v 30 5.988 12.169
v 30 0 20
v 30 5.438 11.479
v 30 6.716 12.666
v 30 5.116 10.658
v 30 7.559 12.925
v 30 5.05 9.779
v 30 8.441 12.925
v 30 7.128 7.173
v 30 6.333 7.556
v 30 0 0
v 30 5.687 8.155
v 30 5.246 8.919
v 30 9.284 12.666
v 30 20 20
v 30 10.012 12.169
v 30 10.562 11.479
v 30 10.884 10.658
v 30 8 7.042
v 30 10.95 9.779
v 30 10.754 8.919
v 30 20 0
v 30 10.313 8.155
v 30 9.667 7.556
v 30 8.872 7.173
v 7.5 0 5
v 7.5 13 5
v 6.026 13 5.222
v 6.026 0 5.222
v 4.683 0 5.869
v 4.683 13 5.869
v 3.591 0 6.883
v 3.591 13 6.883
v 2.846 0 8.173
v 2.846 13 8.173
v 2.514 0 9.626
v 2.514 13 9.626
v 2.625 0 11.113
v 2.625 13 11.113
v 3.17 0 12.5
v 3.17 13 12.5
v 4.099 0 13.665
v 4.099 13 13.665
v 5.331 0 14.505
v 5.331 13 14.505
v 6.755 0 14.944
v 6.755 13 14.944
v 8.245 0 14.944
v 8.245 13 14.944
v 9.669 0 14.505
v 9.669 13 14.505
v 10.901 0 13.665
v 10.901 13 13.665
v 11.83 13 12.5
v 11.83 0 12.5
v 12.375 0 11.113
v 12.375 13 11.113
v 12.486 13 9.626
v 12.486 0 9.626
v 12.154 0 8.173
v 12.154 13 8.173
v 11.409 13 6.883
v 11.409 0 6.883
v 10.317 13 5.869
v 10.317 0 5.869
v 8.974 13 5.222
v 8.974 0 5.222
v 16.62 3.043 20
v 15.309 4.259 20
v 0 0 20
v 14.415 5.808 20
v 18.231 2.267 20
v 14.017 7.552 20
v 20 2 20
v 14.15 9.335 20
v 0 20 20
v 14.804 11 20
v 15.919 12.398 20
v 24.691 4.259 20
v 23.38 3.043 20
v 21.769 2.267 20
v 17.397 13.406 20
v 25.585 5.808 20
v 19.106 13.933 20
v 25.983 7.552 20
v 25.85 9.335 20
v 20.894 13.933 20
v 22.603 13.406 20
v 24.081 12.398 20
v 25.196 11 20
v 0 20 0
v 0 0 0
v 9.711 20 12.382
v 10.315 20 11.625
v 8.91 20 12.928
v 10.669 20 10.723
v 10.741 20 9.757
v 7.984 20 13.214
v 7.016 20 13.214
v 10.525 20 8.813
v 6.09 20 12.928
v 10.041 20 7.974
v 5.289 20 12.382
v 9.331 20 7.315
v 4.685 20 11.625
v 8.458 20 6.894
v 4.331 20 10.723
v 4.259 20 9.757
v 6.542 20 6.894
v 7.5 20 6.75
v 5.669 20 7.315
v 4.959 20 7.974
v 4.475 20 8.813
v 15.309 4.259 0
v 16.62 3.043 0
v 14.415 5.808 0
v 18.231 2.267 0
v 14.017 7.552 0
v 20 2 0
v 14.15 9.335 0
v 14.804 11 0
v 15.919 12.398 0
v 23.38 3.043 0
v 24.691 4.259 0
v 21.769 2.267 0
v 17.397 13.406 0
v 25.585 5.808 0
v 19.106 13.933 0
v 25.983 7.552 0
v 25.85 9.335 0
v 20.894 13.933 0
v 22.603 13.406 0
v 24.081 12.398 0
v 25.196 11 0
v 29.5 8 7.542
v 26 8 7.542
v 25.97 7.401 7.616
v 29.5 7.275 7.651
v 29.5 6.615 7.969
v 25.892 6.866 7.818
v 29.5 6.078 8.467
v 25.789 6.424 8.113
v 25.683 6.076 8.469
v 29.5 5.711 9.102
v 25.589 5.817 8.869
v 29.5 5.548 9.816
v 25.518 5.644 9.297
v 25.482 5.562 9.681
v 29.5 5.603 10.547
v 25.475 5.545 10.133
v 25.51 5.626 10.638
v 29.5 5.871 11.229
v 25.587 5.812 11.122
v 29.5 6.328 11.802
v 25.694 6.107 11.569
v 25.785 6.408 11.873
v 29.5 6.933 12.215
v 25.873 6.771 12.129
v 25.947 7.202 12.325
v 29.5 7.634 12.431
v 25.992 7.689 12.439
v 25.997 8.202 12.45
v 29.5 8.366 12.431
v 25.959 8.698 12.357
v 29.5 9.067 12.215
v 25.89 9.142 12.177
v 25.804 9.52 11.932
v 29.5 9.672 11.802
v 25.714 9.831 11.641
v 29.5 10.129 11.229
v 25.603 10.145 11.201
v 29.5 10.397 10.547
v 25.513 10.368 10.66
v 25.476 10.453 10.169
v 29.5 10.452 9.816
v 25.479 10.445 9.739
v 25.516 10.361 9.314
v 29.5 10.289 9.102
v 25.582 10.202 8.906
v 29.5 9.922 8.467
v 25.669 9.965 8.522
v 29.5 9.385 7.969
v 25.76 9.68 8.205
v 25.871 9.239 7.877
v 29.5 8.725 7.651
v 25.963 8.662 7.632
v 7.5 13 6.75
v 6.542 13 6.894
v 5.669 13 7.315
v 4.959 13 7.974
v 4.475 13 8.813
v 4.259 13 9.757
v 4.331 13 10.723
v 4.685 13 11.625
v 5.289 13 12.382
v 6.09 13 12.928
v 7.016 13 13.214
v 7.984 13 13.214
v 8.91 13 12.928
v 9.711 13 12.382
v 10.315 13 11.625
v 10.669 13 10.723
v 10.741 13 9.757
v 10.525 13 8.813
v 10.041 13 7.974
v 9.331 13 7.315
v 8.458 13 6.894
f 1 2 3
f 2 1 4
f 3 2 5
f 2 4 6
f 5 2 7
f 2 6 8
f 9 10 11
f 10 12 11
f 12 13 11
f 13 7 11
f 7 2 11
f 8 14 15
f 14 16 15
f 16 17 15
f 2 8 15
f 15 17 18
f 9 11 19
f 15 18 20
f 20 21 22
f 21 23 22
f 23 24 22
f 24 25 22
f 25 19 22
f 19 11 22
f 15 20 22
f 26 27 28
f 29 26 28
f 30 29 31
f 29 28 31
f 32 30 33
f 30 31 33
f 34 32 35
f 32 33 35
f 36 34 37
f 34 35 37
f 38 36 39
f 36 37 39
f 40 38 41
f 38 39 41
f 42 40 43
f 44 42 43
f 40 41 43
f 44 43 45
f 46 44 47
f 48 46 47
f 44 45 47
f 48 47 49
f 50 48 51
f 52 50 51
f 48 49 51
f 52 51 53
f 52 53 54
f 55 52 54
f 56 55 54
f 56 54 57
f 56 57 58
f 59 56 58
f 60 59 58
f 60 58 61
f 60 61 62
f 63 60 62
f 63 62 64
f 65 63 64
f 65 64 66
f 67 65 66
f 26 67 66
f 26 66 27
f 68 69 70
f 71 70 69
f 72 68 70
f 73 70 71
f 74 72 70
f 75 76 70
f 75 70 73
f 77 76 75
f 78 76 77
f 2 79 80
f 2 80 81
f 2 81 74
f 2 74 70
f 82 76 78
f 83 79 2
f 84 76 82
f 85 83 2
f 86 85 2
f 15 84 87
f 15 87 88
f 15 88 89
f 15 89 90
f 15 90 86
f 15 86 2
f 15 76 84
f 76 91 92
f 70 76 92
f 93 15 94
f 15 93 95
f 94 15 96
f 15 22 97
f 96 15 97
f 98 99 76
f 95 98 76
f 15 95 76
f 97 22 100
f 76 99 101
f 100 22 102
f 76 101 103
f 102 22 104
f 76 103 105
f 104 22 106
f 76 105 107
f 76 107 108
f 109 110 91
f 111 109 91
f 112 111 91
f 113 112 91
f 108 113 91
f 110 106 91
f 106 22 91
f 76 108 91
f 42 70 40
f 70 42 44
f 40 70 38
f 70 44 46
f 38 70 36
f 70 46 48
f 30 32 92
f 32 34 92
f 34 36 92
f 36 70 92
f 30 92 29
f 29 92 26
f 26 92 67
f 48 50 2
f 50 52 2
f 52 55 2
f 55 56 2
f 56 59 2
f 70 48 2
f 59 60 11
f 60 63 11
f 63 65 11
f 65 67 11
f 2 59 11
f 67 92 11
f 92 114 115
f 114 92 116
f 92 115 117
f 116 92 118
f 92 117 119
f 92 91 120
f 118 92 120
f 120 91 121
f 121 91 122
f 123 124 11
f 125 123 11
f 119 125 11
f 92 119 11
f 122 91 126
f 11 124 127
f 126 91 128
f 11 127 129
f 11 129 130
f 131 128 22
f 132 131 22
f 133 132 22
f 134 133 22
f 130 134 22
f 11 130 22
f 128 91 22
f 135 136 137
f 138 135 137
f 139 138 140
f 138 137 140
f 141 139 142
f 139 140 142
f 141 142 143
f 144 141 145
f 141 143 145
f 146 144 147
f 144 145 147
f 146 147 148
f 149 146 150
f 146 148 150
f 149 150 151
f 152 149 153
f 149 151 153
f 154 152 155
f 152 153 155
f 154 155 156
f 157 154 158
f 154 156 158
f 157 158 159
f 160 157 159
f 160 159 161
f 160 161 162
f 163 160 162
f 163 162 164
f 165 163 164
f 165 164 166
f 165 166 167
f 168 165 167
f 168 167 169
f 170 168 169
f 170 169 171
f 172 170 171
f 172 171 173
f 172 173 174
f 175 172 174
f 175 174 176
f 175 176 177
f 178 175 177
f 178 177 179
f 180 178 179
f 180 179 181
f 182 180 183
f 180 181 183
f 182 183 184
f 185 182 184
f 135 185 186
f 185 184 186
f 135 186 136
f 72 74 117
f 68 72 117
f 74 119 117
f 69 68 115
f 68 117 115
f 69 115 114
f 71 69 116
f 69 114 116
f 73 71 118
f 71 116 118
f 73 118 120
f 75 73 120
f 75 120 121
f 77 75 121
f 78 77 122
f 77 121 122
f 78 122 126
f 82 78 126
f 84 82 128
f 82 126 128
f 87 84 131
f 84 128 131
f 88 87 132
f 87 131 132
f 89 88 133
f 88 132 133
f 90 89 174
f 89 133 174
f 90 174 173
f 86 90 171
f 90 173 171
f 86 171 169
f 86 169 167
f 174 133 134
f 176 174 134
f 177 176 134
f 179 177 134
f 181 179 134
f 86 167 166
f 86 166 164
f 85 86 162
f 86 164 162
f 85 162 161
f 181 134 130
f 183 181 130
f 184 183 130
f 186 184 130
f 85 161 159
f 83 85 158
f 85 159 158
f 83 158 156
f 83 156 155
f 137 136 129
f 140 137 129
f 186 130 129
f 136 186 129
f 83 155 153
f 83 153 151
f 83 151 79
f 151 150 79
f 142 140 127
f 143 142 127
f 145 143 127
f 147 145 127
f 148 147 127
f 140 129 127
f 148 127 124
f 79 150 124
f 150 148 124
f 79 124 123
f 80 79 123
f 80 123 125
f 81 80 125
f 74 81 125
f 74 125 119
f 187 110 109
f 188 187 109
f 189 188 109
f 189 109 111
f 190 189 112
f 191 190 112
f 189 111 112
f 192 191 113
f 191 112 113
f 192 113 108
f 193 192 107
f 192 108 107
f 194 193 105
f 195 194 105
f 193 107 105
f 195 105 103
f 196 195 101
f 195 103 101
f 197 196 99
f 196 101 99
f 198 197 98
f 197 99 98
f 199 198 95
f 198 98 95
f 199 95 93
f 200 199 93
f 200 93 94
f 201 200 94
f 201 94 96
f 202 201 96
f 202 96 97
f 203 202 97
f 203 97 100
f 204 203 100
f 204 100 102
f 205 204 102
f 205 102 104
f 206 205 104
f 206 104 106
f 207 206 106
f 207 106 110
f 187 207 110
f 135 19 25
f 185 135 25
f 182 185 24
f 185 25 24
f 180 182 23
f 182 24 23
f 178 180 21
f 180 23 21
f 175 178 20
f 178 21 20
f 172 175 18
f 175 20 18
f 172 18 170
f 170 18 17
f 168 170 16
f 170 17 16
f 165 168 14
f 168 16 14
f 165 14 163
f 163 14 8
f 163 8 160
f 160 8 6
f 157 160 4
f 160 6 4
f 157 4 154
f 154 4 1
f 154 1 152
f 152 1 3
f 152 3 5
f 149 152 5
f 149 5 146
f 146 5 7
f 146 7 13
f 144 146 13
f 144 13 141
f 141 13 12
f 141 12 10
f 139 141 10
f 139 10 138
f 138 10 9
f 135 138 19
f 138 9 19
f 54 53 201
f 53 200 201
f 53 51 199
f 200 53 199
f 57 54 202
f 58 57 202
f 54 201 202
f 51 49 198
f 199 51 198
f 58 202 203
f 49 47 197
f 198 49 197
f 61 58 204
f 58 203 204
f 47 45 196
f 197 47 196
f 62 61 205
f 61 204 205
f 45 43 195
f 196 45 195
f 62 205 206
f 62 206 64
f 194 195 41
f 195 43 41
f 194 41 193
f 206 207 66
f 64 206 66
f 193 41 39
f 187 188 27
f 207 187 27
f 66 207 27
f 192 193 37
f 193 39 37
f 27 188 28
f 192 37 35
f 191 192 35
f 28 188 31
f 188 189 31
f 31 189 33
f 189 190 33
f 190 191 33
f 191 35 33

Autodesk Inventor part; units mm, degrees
ref_plane "YZ Plane" through (0, 0, 0) normal (1, 0, 0) x (0, 1, 0)
ref_plane "XZ Plane" through (0, 0, 0) normal (0, 1, 0) x (-1, 0, 0)
ref_plane "XY Plane" through (0, 0, 0) normal (0, 0, 1) x (1, 0, 0)
sketch "Sketch1" plane through (0, 0, 0) normal (0, 0, 1) x (1, 0, 0)
  line L0 (0, 0) -> (30, 0)
  line L1 (30, 0) -> (30, 20)
  line L2 (30, 20) -> (0, 20)
  line L3 (0, 20) -> (0, 0)
  dimension "d0" = 30
  dimension "d1" = 20
extrude "Extrusion1" add sketch "Sketch1" along normal blind 20
sketch "Sketch2" plane through (0, 0, 0) normal (0, -1, 0) x (1, 0, 0)
  line L0 (30, 20) -> (0, 20) projected
  line L1 (0, 0) -> (0, 20) projected
  point P0 (7.5, 10)
  dimension "d4" = 7.5
  dimension "d5" = 10
hole "Hole1" at (7.5, 0, 10) direction (0, 1, 0) diameter 6.5 depth 20 tip angle 118 counterbore diameter 10 counterbore depth 13
sketch "Sketch3" plane through (0, 0, 20) normal (0, 0, 1) x (1, 0, 0)
  line L0 (0, 0) -> (0, 20) projected
  line L1 (0, 20) -> (30, 20) projected
  point P0 (20, 8)
  dimension "d13" = 20
  dimension "d14" = 12
hole "Hole2" at (20, 8, 20) direction (0, 0, -1) diameter 12 depth 20 tip angle 118
sketch "Sketch4" plane through (30, 0, 0) normal (1, 0, 0) x (0, 0, -1)
  line L0 (0, 0) -> (0, 20) projected
  line L1 (0, 20) -> (-20, 20) projected
  point P0 (-10, 8)
  dimension "d22" = 10
  dimension "d23" = 12
hole "Hole3" at (30, 8, 10) direction (-1, 0, 0) diameter 4.917 depth 6 tip angle 118 thread size "M6x1" class "6H" standard "ANSI Metric M Profile"
chamfer "Chamfer1" distance 0.5 angle 45 1 edges at (30, 8, 12.4585)
equation "\"d17\" = d14"
equation "\"d26\" = d14"
properties part number "MANCAL DO EIXO DIANTEIRO(7)" material "Carbon Steel"
